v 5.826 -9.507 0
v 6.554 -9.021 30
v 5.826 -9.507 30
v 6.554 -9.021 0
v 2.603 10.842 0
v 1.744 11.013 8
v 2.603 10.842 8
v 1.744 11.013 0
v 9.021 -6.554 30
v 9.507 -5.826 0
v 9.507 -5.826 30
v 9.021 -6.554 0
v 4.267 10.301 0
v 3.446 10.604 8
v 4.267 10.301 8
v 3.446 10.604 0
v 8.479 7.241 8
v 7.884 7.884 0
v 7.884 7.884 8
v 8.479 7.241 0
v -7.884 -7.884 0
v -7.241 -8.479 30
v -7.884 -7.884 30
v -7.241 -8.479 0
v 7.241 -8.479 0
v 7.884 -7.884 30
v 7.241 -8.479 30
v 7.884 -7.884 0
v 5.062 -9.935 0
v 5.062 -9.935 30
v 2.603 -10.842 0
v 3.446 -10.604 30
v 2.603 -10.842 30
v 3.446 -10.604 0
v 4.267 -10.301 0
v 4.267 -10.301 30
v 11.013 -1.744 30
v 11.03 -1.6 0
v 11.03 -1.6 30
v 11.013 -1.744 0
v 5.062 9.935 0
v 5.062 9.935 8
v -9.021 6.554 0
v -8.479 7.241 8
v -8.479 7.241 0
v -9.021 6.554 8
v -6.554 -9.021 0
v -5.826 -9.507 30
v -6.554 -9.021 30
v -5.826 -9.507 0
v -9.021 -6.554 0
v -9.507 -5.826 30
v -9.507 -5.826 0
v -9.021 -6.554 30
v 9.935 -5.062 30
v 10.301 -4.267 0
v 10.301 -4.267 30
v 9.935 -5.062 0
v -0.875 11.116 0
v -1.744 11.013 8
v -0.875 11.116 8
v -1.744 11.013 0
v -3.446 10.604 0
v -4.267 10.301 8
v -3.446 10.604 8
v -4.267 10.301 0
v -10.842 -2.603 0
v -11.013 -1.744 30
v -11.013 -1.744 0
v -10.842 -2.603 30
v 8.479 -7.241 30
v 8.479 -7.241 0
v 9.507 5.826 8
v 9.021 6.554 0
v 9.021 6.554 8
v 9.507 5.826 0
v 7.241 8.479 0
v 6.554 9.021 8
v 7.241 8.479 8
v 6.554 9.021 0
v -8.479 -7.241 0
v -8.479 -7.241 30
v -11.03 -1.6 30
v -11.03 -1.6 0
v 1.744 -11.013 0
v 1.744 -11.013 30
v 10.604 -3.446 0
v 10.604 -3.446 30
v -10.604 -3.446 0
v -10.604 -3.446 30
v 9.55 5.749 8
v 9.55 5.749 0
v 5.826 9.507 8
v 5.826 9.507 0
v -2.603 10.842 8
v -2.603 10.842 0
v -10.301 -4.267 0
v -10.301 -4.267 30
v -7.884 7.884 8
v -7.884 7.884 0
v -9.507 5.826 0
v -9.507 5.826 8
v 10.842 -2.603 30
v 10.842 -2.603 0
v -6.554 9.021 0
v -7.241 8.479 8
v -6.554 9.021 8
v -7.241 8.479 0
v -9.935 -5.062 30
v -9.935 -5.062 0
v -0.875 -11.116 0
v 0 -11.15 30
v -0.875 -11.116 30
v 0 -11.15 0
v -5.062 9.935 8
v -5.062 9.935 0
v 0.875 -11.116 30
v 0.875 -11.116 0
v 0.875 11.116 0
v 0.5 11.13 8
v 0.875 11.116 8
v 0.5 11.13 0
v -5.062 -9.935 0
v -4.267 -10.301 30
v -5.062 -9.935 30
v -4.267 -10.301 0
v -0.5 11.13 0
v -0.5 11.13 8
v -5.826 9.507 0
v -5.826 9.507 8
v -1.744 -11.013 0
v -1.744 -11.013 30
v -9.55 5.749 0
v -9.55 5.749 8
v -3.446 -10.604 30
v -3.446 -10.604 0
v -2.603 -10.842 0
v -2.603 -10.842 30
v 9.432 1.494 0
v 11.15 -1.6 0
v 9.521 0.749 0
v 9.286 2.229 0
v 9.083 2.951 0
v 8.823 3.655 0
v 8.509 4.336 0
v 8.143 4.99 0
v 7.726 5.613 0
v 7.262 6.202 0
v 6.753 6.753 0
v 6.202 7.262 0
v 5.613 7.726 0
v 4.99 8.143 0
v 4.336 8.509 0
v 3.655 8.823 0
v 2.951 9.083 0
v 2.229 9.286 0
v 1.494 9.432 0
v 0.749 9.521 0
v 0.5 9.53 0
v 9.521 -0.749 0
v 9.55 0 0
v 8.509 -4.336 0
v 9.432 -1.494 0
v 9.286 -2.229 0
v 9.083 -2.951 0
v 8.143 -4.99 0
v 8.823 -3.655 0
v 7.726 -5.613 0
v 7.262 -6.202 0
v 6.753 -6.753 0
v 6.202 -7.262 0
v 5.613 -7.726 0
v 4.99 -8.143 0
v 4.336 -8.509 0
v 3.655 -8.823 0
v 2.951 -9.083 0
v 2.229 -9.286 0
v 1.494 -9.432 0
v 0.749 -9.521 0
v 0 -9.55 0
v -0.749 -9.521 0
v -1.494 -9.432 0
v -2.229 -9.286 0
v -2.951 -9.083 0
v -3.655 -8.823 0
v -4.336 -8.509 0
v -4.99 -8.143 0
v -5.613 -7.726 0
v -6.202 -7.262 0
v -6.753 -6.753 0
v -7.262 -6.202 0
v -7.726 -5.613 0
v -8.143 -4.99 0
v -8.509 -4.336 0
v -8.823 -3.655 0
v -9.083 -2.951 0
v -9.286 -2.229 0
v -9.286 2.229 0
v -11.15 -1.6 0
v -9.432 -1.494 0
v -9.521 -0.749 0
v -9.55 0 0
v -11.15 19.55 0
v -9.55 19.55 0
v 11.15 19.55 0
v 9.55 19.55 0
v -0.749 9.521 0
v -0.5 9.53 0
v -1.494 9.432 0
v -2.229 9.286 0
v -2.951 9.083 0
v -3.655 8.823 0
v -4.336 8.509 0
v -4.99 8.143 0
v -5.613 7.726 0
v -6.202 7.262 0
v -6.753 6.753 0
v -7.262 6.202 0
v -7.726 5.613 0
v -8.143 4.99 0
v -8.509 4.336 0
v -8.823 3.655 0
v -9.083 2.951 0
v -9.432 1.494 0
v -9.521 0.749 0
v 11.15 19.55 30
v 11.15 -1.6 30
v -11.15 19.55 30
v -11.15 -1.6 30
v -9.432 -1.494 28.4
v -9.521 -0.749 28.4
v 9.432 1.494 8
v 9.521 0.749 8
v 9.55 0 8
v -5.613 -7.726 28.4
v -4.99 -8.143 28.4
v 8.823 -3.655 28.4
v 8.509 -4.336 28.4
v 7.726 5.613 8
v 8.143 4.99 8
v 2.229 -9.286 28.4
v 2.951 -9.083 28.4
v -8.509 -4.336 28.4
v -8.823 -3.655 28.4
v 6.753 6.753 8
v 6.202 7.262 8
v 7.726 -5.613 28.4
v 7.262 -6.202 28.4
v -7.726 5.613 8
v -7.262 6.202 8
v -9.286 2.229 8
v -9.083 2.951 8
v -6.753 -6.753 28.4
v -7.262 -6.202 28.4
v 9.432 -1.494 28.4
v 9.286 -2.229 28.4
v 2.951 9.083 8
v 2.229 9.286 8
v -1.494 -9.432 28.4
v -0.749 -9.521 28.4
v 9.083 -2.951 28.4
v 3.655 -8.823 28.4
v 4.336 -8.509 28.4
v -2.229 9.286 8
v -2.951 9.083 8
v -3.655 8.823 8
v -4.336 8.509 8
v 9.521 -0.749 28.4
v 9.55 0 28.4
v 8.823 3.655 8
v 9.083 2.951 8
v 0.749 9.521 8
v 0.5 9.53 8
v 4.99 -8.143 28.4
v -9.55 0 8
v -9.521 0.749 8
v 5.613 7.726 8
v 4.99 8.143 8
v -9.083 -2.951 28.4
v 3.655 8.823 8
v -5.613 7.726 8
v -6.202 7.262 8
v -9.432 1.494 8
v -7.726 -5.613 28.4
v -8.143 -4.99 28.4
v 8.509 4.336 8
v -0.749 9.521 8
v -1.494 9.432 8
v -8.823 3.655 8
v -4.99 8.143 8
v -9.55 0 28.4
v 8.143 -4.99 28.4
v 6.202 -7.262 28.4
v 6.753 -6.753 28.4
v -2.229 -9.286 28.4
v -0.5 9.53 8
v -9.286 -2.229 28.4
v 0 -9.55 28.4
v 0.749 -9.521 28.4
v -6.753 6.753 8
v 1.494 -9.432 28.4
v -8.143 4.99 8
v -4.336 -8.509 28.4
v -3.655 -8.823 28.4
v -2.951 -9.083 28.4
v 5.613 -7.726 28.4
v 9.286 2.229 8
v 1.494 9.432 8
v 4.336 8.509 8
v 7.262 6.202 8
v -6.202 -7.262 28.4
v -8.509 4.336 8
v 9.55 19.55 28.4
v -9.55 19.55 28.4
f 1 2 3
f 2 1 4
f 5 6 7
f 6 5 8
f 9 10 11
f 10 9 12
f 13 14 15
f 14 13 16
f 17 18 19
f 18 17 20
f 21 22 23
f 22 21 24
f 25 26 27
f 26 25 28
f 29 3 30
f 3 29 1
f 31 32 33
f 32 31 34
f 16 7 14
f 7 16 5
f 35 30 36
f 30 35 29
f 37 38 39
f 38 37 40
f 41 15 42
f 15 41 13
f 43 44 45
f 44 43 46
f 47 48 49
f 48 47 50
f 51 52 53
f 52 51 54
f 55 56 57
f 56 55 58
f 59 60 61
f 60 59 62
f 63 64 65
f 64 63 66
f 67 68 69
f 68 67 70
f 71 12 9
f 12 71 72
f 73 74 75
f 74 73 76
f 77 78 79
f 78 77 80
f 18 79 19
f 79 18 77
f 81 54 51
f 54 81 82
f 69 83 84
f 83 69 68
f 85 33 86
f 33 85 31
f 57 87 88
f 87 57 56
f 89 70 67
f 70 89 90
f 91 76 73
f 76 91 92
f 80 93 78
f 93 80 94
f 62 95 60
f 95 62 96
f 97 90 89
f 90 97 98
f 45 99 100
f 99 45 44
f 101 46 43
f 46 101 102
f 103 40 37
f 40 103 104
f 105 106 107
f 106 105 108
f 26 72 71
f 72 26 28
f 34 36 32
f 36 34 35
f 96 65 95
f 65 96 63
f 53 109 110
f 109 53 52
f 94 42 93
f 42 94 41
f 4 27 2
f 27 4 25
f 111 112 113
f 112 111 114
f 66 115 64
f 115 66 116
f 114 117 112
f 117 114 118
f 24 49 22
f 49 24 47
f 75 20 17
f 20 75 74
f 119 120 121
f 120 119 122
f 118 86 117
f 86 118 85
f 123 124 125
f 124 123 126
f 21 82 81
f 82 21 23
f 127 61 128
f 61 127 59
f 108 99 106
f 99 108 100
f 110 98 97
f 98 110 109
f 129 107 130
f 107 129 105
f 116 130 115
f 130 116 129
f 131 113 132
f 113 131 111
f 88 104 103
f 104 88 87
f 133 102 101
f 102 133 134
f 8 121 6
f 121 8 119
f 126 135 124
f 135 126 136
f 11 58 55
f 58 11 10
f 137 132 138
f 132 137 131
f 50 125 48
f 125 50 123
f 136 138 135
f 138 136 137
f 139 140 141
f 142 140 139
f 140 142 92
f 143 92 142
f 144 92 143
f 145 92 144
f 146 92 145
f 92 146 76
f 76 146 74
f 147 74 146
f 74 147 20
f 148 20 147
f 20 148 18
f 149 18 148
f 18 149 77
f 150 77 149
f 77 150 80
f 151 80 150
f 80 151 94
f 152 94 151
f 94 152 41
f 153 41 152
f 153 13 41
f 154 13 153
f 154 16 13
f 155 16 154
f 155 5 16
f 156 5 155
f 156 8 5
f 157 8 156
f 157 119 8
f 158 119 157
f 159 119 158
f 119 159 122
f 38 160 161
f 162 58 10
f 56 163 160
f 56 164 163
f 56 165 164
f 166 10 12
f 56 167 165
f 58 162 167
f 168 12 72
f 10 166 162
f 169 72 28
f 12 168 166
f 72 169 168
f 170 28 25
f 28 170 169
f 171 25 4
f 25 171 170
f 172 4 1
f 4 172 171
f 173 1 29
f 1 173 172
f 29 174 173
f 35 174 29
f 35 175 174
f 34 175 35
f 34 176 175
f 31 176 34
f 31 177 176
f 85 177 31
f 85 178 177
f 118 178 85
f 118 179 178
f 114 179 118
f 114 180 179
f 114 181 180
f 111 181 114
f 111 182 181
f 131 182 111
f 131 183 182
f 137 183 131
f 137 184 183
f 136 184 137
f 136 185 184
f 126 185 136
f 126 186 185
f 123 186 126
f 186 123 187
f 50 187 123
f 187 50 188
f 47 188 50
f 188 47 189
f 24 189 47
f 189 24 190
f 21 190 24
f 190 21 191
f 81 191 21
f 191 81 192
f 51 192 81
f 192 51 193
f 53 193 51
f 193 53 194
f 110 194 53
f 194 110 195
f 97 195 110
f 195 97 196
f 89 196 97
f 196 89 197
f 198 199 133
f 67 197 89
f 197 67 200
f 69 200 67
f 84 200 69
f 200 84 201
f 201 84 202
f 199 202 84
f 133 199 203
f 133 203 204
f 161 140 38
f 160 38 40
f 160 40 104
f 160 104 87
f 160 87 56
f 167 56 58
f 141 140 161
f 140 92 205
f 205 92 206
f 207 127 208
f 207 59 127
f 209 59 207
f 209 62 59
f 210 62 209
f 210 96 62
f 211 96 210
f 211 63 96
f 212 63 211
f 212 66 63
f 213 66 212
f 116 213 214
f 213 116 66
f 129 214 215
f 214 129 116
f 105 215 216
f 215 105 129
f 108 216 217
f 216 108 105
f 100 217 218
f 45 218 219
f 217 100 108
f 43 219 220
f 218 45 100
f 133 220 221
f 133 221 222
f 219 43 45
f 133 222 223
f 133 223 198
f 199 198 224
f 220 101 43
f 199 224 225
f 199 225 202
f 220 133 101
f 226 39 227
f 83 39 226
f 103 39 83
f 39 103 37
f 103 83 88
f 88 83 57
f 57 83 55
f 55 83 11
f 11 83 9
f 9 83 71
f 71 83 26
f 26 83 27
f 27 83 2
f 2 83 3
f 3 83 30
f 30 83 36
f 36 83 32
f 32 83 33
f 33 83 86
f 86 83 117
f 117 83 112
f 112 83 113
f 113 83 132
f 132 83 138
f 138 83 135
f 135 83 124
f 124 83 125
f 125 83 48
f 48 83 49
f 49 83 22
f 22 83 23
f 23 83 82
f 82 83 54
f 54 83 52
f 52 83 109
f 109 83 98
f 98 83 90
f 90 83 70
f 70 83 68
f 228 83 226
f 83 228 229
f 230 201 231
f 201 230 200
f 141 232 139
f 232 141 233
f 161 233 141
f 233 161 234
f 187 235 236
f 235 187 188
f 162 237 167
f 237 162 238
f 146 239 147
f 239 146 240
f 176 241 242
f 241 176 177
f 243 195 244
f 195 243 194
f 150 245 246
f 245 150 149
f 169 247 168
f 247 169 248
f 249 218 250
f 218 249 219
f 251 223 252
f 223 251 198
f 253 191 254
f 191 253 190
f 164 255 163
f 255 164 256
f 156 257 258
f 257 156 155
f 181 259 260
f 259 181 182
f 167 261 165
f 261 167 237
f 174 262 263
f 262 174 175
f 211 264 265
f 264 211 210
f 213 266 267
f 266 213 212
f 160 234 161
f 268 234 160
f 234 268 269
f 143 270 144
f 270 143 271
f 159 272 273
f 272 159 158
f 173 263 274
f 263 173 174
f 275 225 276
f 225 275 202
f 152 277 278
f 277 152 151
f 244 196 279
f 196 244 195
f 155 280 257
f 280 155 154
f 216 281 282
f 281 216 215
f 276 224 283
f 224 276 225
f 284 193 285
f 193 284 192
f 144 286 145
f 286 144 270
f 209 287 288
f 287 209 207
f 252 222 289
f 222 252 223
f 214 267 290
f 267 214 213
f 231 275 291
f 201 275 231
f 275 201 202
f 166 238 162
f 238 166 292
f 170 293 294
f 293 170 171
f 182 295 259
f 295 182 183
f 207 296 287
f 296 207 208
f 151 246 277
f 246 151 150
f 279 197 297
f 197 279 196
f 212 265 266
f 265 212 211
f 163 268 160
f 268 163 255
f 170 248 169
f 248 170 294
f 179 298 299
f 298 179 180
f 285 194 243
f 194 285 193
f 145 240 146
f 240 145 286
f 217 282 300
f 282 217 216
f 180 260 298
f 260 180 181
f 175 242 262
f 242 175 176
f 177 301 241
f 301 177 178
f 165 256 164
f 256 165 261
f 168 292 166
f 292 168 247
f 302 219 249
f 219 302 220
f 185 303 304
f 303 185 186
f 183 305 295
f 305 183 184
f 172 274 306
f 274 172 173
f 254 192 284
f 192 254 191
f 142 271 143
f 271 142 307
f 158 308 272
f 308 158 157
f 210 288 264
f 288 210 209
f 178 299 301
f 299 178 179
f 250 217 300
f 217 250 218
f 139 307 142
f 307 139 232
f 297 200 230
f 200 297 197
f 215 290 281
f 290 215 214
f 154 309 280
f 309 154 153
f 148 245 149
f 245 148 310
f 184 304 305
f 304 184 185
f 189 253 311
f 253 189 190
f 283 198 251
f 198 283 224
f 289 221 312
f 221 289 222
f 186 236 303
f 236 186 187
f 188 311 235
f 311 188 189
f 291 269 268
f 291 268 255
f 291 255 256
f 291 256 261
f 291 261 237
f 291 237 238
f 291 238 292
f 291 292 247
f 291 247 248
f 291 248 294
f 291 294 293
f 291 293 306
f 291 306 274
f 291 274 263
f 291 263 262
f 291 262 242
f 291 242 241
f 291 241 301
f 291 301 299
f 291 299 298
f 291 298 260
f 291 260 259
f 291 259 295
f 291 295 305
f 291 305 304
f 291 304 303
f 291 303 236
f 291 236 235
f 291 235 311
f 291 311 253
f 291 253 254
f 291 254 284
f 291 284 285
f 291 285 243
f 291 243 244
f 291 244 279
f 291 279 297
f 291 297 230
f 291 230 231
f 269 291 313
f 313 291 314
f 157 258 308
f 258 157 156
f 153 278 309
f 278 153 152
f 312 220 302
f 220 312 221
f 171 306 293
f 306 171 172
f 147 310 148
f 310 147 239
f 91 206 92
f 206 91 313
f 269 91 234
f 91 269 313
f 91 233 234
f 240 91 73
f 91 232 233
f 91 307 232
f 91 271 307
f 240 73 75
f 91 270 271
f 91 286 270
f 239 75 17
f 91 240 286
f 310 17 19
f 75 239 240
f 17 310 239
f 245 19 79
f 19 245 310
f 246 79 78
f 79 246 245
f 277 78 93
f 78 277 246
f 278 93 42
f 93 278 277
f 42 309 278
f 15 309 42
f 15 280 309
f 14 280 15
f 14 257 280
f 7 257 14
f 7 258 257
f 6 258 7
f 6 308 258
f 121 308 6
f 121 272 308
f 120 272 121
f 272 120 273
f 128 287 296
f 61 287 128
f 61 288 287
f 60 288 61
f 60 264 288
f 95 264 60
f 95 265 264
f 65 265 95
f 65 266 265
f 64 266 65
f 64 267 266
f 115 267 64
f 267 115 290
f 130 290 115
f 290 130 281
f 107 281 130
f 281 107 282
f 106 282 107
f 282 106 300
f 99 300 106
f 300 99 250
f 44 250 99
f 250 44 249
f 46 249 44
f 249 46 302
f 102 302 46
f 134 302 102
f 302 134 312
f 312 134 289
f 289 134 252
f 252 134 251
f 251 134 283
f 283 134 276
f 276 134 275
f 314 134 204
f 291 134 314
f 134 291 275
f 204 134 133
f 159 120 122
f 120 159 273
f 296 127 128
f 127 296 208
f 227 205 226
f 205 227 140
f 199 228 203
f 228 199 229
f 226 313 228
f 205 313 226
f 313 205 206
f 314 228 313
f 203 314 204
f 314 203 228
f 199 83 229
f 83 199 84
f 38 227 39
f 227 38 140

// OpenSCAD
$fa=0.01;
$fn=80;
height_tube = 30;
tube_id = 19.1;
tube_wall_thinkness=1.6;
dispo_length_extra=10;
dispo_length =dispo_length_extra+tube_id/2+tube_wall_thinkness ;
tube_recess=8;

difference(){
  union(){
cylinder(h = height_tube, d = tube_id+tube_wall_thinkness*2);
// translate([-(tube_id+tube_wall_thinkness*2)/2,-tube_wall_thinkness]) cube([tube_id+tube_wall_thinkness*2,dispo_length,height_tube ]);
}
translate([0,0,-tube_wall_thinkness]) cylinder(h = height_tube, d = tube_id);
translate([-tube_id/2,0,tube_recess]) cube([tube_id,dispo_length,height_tube-tube_recess]);
#translate([-1/2,tube_id/2-0.1/2, -0.01/2 ])cube([1,tube_wall_thinkness+0.1, tube_recess+0.01]);
}

difference(){
  union(){
// cylinder(h = height_tube, d = tube_id+tube_wall_thinkness*2);
translate([-(tube_id+tube_wall_thinkness*2)/2,-tube_wall_thinkness]) cube([tube_id+tube_wall_thinkness*2,dispo_length,height_tube ]);
}
translate([0,0,-tube_wall_thinkness]) cylinder(h = height_tube, d = tube_id);
translate([-tube_id/2,0,-tube_wall_thinkness]) cube([tube_id,dispo_length,height_tube]);
}
